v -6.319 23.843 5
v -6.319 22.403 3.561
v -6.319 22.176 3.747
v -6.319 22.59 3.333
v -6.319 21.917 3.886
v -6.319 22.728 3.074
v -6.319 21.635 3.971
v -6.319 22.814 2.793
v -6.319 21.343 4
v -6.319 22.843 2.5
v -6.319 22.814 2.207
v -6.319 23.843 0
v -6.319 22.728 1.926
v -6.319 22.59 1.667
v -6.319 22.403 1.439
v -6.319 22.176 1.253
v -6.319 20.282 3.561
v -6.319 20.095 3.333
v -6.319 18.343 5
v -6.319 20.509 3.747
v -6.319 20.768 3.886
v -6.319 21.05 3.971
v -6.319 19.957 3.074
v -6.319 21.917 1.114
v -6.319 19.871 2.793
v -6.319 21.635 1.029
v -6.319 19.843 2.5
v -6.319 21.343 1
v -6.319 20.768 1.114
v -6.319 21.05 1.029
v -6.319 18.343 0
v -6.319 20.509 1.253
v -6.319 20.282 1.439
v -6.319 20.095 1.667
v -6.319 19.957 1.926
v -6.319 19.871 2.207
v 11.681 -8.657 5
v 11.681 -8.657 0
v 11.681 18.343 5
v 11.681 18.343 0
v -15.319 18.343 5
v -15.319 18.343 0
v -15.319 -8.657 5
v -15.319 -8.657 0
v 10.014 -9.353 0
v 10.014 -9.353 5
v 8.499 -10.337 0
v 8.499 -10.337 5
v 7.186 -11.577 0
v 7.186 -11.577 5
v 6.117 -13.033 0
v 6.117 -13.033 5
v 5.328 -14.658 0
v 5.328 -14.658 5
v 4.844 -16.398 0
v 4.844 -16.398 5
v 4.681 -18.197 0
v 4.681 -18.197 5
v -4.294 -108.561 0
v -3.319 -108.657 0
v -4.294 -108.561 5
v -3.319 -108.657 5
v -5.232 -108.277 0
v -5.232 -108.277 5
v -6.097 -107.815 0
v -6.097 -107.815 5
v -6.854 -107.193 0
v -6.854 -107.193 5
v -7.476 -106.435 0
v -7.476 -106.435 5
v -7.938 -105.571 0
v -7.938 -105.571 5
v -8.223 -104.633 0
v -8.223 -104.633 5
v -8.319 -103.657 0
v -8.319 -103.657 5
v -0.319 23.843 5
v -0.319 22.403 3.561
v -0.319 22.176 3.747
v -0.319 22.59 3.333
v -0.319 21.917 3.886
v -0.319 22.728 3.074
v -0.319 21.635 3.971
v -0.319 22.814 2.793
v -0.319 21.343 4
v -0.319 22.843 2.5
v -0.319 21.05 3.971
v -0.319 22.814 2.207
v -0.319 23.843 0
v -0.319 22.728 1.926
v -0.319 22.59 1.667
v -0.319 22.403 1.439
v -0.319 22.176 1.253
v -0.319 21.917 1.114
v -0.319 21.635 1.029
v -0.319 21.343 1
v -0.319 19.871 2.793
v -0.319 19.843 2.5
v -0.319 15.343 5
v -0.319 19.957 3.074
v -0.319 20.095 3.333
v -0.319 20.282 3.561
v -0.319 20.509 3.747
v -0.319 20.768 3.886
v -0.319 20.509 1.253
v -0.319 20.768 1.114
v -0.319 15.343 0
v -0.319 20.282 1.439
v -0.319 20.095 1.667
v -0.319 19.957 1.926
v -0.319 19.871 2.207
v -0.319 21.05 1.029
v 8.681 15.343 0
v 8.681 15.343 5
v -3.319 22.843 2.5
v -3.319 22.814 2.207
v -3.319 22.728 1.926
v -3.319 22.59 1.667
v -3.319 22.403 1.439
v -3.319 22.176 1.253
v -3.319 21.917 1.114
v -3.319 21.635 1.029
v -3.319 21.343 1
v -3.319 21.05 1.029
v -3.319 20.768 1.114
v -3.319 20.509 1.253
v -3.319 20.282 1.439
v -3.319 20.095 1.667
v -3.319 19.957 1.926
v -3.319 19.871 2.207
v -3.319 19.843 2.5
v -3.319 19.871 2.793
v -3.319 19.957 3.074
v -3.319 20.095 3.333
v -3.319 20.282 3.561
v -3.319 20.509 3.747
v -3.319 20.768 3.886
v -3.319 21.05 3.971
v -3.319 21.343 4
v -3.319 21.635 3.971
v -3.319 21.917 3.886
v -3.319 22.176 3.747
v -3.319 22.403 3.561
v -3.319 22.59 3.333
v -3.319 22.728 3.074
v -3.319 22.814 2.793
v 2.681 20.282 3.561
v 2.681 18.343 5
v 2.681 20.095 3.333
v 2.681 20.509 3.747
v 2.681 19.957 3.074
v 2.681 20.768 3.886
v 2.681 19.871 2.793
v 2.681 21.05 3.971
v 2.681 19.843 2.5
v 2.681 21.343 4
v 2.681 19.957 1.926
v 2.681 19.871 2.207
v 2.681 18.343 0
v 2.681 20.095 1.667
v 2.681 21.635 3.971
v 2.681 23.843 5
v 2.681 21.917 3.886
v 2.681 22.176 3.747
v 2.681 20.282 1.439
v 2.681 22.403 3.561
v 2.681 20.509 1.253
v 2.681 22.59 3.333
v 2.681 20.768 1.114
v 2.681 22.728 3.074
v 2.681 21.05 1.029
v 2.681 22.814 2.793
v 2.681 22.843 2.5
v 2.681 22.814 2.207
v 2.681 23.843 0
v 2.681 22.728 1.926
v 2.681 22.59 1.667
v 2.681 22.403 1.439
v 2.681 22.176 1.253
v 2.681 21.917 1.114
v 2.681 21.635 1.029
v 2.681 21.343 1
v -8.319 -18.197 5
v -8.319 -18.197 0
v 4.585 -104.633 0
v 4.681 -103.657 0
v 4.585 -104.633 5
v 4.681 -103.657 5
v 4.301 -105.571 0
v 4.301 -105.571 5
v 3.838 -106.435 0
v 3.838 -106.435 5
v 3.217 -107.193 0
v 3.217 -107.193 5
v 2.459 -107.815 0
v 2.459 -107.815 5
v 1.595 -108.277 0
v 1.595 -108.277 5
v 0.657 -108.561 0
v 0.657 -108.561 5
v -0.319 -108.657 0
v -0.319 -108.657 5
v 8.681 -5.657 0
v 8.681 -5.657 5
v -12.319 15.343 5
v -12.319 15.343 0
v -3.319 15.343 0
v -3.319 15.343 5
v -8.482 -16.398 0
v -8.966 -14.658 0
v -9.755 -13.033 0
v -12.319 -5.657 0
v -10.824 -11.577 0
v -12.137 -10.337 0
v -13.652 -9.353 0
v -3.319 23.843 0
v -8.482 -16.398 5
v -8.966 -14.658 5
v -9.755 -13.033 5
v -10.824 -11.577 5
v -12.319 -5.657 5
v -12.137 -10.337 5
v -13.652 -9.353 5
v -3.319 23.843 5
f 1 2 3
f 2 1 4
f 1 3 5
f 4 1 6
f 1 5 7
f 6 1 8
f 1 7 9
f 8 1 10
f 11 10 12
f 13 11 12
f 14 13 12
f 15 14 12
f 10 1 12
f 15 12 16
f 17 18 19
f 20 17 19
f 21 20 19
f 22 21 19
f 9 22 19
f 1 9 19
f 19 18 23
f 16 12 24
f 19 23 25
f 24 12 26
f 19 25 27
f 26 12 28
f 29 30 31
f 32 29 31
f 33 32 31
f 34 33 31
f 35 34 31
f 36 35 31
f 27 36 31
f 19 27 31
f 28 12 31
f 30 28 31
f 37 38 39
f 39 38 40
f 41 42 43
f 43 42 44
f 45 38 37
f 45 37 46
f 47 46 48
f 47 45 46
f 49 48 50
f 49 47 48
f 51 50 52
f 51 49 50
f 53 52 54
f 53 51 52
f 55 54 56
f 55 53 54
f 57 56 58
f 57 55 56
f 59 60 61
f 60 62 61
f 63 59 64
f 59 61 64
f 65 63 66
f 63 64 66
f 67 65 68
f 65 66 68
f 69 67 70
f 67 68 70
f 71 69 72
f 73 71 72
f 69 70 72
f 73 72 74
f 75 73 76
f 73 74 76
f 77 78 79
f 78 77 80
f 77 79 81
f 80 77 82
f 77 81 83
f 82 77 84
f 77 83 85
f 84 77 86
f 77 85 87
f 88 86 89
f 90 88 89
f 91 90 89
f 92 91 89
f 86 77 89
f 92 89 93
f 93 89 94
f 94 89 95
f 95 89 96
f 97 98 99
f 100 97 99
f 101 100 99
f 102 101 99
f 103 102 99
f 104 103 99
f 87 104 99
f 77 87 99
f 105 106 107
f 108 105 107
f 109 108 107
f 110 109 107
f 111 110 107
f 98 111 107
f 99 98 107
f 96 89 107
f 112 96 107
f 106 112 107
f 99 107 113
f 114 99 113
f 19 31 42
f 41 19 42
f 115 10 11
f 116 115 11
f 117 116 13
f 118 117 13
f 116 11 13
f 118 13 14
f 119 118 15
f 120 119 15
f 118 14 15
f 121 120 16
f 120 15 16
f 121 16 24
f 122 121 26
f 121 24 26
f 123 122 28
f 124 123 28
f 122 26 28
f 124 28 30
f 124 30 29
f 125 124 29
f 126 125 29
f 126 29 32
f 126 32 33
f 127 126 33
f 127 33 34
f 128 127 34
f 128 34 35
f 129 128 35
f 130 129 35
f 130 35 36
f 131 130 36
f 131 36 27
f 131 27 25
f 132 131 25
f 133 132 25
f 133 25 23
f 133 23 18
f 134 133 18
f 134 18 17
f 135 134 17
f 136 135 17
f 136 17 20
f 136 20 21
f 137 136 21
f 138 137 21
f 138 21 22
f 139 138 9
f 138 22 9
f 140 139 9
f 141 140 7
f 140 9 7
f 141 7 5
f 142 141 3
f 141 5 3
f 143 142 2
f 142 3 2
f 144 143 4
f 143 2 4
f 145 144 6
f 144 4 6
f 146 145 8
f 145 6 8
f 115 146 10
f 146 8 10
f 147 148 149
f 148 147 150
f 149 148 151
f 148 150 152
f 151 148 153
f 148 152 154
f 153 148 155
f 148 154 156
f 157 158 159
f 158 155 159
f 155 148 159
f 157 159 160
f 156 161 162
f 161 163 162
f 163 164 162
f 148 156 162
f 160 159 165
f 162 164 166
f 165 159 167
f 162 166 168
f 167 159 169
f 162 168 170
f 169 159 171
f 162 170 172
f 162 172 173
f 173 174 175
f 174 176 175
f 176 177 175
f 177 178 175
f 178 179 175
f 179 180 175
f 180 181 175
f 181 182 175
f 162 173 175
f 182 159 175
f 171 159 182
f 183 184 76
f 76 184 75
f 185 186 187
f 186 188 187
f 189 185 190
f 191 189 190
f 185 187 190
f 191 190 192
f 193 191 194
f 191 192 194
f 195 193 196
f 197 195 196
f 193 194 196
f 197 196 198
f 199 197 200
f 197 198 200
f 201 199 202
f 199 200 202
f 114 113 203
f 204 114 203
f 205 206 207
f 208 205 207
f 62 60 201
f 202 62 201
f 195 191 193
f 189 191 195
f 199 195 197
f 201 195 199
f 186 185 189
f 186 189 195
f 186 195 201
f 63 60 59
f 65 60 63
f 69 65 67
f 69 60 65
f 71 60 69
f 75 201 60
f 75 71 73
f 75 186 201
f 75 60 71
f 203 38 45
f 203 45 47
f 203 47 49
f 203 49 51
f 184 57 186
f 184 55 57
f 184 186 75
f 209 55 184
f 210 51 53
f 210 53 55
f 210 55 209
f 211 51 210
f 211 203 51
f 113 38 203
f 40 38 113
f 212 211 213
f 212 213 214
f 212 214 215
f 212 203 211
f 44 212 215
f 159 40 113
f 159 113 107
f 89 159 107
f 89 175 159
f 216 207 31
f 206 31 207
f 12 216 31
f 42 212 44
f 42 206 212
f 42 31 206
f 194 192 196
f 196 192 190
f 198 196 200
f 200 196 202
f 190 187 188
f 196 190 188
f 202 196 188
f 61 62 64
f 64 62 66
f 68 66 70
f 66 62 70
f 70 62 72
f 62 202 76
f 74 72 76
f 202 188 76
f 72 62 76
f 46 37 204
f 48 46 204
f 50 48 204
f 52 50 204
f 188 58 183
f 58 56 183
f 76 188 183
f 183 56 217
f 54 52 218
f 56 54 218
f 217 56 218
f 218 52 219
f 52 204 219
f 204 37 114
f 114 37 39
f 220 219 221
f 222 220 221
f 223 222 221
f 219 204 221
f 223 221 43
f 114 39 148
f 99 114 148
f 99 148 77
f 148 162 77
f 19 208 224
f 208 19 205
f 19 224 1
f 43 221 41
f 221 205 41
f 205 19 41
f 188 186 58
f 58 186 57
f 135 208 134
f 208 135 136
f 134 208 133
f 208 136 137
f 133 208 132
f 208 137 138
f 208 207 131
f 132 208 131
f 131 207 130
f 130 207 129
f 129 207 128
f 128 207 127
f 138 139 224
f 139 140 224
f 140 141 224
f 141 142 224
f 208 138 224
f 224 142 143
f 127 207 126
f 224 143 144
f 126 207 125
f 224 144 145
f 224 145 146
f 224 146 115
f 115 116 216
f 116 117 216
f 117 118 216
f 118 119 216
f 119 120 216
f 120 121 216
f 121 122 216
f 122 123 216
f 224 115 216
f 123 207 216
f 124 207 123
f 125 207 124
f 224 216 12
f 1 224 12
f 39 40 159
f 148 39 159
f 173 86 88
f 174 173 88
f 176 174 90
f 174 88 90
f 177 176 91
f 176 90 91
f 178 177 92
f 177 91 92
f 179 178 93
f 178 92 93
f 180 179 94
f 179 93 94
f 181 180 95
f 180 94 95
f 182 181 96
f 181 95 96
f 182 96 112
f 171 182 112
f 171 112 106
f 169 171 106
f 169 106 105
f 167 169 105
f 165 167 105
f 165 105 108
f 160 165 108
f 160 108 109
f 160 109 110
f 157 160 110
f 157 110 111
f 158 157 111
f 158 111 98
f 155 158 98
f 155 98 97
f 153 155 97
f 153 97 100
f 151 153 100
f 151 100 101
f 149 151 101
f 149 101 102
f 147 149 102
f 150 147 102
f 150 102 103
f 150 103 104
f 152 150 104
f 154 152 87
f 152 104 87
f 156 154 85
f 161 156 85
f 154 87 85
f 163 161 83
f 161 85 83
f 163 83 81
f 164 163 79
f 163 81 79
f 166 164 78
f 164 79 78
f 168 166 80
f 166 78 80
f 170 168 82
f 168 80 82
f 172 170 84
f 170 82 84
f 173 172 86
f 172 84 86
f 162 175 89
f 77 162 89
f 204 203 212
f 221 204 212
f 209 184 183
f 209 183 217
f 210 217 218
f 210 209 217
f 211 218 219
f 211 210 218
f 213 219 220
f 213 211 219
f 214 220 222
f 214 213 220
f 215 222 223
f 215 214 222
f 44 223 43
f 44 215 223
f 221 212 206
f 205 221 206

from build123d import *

# Parameters (mm, degrees)
BOSS_EXTRUDE1_DEPTH = 5
FILLET1_R           = 10
FILLET2_R           = 5
SKETCH3_R           = 1.5
CUT_EXTRUDE1_DEPTH  = 15


with BuildPart() as part:
    # Sketch1 → Boss-Extrude1 (new body)
    with BuildSketch(Plane.XY):
        Polygon((4.681102362, -8.657480315), (11.681102362, -8.657480315), (11.681102362, 18.342519685), (2.681102362, 18.342519685), (2.681102362, 23.842519685), (-0.318897638, 23.842519685), (-0.318897638, 18.342519685), (-0.318897638, 15.342519685), (8.681102362, 15.342519685), (8.681102362, -5.657480315), (-12.318897638, -5.657480315), (-12.318897638, 15.342519685), (-3.318897638, 15.342519685), (-3.318897638, 18.342519685), (-3.318897638, 23.842519685), (-6.318897638, 23.842519685), (-6.318897638, 18.342519685), (-15.318897638, 18.342519685), (-15.318897638, -8.657480315), (-8.318897638, -8.657480315), (-8.318897638, -108.657480315), (4.681102362, -108.657480315), align=None)
    extrude(amount=BOSS_EXTRUDE1_DEPTH)

    # Fillet1
    # the kernel refuses this fillet: 10 mm, written as the material it adds along each edge
    with BuildSketch(Plane(origin=(-8.318897638, -8.657480315, 0), x_dir=(0, -1, 0), z_dir=(0, 0, 1))) as fillet1_piece_1:
        with BuildLine():
            CenterArc((9.539392014, -10), FILLET1_R, 90, 72.542396876)
            Line((0, -7), (-0.19078784, -6.94))
            ThreePointArc((-0.19078784, -6.94), (-0.2, -3.5), (-0.2, 0))
            Line((-0.2, 0), (0, 0.2))
            Line((0, 0.2), (9.539392014, 0.2))
            Line((9.539392014, 0.2), (9.539392014, 0))
        make_face()
    extrude(amount=5)
    with BuildSketch(Plane(origin=(4.681102362, -8.657480315, 0), x_dir=(1, 0, 0), z_dir=(0, 0, 1))) as fillet1_piece_2:
        with BuildLine():
            CenterArc((10, -9.539392014), FILLET1_R, 107.457603124, 72.542396876)
            Line((0, -9.539392014), (-0.2, -9.539392014))
            Line((-0.2, -9.539392014), (-0.2, 0))
            Line((-0.2, 0), (0, 0.2))
            ThreePointArc((0, 0.2), (3.5, 0.2), (6.94, 0.19078784))
            Line((6.94, 0.19078784), (7, 0))
        make_face()
    extrude(amount=5)

    # Fillet2
    fillet2_edges = [part.edges().sort_by_distance(p)[0] for p in [
        (4.681102362, -108.657480315, 2.5),
        (-8.318897638, -108.657480315, 2.5),
    ]]
    fillet(fillet2_edges, radius=FILLET2_R)

    # Sketch3 → Cut-Extrude1 (cut)
    with BuildSketch(Plane.ZY.offset(6.318897638)):
        with Locations(Location((2.5, 21.342519685, 0), (0, 0, 90))):
            Circle(SKETCH3_R)
    extrude(amount=-CUT_EXTRUDE1_DEPTH, mode=Mode.SUBTRACT)


solid = part.part
